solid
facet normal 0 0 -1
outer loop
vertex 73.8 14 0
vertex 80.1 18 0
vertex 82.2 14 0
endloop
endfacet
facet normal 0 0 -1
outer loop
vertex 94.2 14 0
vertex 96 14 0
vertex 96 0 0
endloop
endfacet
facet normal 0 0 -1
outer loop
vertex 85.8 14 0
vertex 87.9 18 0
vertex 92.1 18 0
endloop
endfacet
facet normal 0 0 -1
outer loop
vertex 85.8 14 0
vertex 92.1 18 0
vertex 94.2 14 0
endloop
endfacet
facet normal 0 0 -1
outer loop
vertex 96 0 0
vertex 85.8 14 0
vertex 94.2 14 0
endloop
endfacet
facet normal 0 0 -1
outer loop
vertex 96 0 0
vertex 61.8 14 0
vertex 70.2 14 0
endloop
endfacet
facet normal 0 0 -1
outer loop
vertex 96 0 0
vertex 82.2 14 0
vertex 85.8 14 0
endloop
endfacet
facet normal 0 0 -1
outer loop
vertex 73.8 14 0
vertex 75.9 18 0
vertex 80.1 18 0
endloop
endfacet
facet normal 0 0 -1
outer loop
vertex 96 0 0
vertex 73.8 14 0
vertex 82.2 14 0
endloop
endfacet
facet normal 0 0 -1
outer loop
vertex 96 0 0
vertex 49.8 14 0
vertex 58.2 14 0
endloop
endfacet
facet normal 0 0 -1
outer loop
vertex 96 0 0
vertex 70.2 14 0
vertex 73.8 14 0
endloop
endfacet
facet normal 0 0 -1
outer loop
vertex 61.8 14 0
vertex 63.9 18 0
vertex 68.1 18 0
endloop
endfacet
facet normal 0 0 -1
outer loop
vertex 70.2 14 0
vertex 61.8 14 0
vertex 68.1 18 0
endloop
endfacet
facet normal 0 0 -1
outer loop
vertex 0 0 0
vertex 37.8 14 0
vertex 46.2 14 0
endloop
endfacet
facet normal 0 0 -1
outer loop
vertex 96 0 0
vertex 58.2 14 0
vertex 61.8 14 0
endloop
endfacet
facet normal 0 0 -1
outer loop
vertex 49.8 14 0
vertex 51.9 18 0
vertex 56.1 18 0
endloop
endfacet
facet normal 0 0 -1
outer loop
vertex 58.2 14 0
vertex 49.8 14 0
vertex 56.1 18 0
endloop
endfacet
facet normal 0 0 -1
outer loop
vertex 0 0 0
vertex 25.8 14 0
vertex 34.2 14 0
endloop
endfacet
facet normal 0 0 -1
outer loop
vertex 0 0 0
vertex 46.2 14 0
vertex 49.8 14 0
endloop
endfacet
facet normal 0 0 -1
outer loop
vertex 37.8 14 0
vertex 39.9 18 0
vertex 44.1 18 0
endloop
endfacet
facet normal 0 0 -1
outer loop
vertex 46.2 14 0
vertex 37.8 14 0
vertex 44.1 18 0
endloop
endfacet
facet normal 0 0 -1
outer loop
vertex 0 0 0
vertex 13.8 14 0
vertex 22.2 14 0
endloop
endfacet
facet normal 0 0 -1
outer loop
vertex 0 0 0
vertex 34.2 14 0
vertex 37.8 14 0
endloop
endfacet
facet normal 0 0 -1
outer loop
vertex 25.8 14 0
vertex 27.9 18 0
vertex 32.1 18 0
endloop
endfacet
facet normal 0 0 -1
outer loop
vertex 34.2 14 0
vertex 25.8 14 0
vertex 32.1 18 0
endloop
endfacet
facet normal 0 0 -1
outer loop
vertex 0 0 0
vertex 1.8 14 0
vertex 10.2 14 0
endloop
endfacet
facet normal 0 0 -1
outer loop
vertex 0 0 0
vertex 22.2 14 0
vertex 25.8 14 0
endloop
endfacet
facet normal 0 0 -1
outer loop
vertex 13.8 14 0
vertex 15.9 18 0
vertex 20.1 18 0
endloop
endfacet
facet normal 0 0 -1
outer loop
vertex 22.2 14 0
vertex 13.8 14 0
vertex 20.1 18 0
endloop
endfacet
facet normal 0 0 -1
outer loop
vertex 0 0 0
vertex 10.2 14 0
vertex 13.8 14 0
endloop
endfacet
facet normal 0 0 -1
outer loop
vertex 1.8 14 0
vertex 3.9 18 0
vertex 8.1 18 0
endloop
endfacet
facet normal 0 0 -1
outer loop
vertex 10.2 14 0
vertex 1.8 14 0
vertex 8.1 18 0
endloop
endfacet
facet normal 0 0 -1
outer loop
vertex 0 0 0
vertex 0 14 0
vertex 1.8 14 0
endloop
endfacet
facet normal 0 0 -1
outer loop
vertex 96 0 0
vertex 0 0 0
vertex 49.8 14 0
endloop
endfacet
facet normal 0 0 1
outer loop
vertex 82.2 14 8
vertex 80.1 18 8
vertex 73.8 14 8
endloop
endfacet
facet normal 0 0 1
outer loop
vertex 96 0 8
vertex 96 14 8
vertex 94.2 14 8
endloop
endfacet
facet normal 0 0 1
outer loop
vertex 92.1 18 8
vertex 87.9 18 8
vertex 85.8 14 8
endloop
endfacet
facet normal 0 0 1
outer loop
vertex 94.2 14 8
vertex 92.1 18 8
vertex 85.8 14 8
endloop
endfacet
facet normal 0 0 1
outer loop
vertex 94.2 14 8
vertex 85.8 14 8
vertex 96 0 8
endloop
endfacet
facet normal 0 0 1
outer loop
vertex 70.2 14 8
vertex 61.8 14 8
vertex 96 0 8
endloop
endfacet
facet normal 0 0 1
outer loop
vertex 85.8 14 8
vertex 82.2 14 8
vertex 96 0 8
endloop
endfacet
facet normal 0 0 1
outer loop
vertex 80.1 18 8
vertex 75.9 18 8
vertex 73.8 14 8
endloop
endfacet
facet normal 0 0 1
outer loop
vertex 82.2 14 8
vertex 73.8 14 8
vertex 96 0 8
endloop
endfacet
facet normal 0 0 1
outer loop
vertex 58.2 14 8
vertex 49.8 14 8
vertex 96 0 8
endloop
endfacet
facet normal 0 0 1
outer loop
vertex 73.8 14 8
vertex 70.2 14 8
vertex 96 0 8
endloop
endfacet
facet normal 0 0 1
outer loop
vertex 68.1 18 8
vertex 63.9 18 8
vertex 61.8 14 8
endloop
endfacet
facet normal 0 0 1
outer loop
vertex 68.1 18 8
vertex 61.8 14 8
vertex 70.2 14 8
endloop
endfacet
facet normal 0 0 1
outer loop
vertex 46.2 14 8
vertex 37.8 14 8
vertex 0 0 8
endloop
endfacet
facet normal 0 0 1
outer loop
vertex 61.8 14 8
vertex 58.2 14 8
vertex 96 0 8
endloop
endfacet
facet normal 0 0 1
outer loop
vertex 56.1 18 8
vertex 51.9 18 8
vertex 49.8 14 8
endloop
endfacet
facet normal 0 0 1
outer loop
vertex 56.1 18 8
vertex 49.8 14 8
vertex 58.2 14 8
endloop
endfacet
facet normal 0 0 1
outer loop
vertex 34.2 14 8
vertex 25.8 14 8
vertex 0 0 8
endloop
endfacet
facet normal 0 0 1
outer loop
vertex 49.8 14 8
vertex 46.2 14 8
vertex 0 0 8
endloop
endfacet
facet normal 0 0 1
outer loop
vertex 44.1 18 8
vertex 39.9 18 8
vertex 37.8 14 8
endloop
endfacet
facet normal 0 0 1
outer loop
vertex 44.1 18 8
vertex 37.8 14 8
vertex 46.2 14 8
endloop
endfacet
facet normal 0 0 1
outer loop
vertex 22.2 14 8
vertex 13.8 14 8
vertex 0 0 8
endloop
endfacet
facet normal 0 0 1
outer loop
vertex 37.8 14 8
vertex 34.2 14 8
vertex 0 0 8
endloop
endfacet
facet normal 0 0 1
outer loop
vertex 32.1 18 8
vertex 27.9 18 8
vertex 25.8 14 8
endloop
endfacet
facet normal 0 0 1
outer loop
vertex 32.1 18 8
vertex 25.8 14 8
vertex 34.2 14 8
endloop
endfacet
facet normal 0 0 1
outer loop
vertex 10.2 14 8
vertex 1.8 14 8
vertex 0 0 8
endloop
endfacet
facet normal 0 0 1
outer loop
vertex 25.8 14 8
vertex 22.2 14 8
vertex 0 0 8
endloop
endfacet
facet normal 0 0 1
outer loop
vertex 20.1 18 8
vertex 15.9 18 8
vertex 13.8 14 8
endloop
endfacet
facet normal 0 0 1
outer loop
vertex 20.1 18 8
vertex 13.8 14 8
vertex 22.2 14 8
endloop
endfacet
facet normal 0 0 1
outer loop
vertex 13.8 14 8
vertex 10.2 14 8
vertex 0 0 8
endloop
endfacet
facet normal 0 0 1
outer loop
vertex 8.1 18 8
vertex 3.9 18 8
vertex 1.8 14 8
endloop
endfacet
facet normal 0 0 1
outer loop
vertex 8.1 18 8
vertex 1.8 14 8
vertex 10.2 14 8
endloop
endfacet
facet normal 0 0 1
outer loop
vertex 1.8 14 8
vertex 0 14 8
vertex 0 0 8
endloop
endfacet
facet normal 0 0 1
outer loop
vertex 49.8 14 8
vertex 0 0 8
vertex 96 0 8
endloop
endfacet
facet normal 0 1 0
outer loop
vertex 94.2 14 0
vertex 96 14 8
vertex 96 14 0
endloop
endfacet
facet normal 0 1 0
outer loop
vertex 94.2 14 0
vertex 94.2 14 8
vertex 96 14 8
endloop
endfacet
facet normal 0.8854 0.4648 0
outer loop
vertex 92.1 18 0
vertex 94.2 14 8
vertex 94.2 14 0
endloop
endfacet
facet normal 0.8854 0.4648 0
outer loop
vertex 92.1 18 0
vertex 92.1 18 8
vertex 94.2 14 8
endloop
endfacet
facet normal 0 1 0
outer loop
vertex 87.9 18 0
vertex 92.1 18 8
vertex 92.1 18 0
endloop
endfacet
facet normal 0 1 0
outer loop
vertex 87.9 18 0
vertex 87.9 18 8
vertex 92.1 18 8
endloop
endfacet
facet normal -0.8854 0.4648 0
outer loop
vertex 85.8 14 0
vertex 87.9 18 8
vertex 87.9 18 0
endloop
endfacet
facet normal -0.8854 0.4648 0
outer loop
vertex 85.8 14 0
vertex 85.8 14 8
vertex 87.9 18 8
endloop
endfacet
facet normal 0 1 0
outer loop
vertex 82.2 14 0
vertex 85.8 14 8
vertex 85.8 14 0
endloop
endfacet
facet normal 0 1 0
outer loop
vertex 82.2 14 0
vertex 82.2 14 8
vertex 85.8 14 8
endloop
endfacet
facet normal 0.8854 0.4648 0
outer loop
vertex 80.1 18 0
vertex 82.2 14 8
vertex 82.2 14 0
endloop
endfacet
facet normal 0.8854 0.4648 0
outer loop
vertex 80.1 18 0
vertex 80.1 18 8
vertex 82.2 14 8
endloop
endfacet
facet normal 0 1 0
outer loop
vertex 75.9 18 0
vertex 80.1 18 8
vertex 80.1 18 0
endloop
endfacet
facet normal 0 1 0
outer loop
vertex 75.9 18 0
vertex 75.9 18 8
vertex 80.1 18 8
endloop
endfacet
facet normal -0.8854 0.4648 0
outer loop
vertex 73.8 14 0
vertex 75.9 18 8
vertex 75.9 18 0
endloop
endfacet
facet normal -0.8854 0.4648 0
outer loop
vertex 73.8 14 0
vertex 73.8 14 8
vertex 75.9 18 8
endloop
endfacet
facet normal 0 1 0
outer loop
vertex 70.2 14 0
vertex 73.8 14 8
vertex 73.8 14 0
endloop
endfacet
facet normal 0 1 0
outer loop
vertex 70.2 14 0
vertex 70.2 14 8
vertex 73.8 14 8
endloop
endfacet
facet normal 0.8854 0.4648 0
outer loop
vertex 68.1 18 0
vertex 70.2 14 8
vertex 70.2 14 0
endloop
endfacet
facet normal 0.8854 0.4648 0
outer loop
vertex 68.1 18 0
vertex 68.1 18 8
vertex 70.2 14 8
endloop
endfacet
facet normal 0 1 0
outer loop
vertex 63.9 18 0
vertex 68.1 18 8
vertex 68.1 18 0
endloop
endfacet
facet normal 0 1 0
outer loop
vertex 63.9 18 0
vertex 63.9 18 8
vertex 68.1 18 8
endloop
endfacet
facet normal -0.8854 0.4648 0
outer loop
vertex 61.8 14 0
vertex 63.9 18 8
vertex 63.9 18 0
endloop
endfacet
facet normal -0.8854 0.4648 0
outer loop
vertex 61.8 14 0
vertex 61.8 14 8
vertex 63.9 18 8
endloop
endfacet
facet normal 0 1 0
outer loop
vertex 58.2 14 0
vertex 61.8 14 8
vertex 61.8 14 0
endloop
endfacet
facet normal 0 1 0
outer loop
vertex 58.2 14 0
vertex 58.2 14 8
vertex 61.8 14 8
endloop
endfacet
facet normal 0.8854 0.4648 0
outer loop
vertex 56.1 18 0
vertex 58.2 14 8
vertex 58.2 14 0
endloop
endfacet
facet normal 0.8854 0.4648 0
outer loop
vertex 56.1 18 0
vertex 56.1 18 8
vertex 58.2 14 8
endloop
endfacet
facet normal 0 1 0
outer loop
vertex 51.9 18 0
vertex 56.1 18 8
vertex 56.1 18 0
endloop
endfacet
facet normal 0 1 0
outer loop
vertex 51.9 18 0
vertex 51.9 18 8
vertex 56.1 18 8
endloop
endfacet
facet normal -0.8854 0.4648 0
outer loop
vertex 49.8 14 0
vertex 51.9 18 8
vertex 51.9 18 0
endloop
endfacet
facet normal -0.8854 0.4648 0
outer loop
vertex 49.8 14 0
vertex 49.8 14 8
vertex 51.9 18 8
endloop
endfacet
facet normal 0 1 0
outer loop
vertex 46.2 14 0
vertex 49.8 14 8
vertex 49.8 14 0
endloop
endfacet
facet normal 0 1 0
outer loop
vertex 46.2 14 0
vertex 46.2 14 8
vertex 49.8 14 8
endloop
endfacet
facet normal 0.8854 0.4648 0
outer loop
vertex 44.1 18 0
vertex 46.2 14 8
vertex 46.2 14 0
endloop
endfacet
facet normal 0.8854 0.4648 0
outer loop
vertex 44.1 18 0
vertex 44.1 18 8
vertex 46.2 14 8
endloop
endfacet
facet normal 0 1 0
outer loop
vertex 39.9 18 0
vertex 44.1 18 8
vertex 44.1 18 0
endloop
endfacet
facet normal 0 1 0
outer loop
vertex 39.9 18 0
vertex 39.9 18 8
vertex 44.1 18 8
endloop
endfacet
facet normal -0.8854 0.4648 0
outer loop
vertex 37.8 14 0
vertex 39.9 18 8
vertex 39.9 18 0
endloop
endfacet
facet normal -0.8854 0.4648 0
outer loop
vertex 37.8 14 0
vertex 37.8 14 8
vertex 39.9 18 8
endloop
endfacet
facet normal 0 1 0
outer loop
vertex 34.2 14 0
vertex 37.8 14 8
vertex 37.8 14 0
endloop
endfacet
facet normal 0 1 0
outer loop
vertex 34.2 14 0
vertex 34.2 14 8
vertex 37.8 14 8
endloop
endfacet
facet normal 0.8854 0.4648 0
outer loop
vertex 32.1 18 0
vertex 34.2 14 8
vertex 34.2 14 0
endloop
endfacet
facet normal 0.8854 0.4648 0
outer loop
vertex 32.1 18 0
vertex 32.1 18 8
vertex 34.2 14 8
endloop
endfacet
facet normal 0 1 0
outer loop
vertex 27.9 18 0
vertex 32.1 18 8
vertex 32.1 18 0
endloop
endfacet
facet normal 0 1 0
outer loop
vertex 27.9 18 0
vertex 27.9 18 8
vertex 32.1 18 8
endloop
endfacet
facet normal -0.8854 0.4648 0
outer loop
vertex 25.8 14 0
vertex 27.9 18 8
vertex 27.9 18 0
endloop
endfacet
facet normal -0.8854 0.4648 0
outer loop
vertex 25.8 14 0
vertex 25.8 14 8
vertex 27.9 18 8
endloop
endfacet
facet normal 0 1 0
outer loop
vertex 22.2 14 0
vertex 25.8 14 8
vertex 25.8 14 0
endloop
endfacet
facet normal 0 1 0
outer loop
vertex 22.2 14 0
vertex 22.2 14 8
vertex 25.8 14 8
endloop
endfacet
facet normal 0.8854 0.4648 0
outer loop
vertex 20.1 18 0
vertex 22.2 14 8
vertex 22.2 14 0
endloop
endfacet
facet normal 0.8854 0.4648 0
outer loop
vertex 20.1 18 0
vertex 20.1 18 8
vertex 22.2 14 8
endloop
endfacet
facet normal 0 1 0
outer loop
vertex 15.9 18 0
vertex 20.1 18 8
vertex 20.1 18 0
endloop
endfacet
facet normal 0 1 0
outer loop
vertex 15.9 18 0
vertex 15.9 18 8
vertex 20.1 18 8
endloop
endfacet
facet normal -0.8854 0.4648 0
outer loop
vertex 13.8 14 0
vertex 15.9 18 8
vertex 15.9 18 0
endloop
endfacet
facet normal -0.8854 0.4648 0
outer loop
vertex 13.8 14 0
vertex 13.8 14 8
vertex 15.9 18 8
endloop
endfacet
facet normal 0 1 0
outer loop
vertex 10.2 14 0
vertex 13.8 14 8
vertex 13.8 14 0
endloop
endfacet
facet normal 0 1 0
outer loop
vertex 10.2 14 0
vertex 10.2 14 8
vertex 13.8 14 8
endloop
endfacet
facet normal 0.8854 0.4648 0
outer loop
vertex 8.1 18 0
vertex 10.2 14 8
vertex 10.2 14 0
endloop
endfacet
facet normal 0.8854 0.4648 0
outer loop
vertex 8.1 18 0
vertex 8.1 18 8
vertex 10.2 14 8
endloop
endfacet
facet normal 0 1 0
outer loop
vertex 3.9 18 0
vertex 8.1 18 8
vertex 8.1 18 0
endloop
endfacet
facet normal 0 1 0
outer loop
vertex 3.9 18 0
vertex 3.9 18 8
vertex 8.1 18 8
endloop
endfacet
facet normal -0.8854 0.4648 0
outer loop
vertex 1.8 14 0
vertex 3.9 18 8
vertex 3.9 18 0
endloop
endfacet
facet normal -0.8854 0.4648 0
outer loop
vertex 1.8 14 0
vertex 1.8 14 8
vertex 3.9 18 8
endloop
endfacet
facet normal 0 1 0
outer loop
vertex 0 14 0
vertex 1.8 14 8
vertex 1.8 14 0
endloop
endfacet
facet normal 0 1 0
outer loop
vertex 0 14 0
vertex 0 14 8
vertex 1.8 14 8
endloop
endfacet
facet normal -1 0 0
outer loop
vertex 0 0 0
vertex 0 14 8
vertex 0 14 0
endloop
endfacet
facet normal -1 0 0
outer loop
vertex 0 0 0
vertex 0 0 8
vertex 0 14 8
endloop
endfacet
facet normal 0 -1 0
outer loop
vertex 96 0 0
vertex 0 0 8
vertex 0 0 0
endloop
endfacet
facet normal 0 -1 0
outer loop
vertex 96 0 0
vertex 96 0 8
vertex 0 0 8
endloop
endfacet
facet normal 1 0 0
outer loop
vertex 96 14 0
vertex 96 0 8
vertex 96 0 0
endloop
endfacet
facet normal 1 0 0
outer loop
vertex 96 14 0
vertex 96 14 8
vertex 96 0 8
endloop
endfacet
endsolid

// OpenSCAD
$fn = 32;

// ----------------------------------------------------------------------
// Gear rack: 8 teeth, pitch 12 mm
// ----------------------------------------------------------------------

// --- parameters (mm) ---
teeth = 8;                // number of teeth
pitch = 12;               // tooth pitch, X
root_w = 8.4;             // tooth width at the root
tip_w = 4.2;              // tooth width at the tip
base_h = 14;              // rack body height, Y
tooth_h = 4;              // tooth height above the body
plate_t = 8;              // rack width, Z (extrusion height)
fit_tol = 0.05;           // declared fit tolerance (prompt contract)
free_tol = 0.3;           // declared free tolerance (prompt contract)

rack_l = teeth * pitch;  // overall length
total_h = base_h + tooth_h;  // overall height

profile = [[0, 0], [96, 0], [96, 14], [94.2, 14], [92.1, 18], [87.9, 18], [85.8, 14], [82.2, 14], [80.1, 18], [75.9, 18], [73.8, 14], [70.2, 14], [68.1, 18], [63.9, 18], [61.8, 14], [58.2, 14], [56.1, 18], [51.9, 18], [49.8, 14], [46.2, 14], [44.1, 18], [39.9, 18], [37.8, 14], [34.2, 14], [32.1, 18], [27.9, 18], [25.8, 14], [22.2, 14], [20.1, 18], [15.9, 18], [13.8, 14], [10.2, 14], [8.1, 18], [3.9, 18], [1.8, 14], [0, 14]];  // primary outline, 36 points, counter clockwise

// --- the one profile operation ---
linear_extrude(height = plate_t) polygon(points = profile);
